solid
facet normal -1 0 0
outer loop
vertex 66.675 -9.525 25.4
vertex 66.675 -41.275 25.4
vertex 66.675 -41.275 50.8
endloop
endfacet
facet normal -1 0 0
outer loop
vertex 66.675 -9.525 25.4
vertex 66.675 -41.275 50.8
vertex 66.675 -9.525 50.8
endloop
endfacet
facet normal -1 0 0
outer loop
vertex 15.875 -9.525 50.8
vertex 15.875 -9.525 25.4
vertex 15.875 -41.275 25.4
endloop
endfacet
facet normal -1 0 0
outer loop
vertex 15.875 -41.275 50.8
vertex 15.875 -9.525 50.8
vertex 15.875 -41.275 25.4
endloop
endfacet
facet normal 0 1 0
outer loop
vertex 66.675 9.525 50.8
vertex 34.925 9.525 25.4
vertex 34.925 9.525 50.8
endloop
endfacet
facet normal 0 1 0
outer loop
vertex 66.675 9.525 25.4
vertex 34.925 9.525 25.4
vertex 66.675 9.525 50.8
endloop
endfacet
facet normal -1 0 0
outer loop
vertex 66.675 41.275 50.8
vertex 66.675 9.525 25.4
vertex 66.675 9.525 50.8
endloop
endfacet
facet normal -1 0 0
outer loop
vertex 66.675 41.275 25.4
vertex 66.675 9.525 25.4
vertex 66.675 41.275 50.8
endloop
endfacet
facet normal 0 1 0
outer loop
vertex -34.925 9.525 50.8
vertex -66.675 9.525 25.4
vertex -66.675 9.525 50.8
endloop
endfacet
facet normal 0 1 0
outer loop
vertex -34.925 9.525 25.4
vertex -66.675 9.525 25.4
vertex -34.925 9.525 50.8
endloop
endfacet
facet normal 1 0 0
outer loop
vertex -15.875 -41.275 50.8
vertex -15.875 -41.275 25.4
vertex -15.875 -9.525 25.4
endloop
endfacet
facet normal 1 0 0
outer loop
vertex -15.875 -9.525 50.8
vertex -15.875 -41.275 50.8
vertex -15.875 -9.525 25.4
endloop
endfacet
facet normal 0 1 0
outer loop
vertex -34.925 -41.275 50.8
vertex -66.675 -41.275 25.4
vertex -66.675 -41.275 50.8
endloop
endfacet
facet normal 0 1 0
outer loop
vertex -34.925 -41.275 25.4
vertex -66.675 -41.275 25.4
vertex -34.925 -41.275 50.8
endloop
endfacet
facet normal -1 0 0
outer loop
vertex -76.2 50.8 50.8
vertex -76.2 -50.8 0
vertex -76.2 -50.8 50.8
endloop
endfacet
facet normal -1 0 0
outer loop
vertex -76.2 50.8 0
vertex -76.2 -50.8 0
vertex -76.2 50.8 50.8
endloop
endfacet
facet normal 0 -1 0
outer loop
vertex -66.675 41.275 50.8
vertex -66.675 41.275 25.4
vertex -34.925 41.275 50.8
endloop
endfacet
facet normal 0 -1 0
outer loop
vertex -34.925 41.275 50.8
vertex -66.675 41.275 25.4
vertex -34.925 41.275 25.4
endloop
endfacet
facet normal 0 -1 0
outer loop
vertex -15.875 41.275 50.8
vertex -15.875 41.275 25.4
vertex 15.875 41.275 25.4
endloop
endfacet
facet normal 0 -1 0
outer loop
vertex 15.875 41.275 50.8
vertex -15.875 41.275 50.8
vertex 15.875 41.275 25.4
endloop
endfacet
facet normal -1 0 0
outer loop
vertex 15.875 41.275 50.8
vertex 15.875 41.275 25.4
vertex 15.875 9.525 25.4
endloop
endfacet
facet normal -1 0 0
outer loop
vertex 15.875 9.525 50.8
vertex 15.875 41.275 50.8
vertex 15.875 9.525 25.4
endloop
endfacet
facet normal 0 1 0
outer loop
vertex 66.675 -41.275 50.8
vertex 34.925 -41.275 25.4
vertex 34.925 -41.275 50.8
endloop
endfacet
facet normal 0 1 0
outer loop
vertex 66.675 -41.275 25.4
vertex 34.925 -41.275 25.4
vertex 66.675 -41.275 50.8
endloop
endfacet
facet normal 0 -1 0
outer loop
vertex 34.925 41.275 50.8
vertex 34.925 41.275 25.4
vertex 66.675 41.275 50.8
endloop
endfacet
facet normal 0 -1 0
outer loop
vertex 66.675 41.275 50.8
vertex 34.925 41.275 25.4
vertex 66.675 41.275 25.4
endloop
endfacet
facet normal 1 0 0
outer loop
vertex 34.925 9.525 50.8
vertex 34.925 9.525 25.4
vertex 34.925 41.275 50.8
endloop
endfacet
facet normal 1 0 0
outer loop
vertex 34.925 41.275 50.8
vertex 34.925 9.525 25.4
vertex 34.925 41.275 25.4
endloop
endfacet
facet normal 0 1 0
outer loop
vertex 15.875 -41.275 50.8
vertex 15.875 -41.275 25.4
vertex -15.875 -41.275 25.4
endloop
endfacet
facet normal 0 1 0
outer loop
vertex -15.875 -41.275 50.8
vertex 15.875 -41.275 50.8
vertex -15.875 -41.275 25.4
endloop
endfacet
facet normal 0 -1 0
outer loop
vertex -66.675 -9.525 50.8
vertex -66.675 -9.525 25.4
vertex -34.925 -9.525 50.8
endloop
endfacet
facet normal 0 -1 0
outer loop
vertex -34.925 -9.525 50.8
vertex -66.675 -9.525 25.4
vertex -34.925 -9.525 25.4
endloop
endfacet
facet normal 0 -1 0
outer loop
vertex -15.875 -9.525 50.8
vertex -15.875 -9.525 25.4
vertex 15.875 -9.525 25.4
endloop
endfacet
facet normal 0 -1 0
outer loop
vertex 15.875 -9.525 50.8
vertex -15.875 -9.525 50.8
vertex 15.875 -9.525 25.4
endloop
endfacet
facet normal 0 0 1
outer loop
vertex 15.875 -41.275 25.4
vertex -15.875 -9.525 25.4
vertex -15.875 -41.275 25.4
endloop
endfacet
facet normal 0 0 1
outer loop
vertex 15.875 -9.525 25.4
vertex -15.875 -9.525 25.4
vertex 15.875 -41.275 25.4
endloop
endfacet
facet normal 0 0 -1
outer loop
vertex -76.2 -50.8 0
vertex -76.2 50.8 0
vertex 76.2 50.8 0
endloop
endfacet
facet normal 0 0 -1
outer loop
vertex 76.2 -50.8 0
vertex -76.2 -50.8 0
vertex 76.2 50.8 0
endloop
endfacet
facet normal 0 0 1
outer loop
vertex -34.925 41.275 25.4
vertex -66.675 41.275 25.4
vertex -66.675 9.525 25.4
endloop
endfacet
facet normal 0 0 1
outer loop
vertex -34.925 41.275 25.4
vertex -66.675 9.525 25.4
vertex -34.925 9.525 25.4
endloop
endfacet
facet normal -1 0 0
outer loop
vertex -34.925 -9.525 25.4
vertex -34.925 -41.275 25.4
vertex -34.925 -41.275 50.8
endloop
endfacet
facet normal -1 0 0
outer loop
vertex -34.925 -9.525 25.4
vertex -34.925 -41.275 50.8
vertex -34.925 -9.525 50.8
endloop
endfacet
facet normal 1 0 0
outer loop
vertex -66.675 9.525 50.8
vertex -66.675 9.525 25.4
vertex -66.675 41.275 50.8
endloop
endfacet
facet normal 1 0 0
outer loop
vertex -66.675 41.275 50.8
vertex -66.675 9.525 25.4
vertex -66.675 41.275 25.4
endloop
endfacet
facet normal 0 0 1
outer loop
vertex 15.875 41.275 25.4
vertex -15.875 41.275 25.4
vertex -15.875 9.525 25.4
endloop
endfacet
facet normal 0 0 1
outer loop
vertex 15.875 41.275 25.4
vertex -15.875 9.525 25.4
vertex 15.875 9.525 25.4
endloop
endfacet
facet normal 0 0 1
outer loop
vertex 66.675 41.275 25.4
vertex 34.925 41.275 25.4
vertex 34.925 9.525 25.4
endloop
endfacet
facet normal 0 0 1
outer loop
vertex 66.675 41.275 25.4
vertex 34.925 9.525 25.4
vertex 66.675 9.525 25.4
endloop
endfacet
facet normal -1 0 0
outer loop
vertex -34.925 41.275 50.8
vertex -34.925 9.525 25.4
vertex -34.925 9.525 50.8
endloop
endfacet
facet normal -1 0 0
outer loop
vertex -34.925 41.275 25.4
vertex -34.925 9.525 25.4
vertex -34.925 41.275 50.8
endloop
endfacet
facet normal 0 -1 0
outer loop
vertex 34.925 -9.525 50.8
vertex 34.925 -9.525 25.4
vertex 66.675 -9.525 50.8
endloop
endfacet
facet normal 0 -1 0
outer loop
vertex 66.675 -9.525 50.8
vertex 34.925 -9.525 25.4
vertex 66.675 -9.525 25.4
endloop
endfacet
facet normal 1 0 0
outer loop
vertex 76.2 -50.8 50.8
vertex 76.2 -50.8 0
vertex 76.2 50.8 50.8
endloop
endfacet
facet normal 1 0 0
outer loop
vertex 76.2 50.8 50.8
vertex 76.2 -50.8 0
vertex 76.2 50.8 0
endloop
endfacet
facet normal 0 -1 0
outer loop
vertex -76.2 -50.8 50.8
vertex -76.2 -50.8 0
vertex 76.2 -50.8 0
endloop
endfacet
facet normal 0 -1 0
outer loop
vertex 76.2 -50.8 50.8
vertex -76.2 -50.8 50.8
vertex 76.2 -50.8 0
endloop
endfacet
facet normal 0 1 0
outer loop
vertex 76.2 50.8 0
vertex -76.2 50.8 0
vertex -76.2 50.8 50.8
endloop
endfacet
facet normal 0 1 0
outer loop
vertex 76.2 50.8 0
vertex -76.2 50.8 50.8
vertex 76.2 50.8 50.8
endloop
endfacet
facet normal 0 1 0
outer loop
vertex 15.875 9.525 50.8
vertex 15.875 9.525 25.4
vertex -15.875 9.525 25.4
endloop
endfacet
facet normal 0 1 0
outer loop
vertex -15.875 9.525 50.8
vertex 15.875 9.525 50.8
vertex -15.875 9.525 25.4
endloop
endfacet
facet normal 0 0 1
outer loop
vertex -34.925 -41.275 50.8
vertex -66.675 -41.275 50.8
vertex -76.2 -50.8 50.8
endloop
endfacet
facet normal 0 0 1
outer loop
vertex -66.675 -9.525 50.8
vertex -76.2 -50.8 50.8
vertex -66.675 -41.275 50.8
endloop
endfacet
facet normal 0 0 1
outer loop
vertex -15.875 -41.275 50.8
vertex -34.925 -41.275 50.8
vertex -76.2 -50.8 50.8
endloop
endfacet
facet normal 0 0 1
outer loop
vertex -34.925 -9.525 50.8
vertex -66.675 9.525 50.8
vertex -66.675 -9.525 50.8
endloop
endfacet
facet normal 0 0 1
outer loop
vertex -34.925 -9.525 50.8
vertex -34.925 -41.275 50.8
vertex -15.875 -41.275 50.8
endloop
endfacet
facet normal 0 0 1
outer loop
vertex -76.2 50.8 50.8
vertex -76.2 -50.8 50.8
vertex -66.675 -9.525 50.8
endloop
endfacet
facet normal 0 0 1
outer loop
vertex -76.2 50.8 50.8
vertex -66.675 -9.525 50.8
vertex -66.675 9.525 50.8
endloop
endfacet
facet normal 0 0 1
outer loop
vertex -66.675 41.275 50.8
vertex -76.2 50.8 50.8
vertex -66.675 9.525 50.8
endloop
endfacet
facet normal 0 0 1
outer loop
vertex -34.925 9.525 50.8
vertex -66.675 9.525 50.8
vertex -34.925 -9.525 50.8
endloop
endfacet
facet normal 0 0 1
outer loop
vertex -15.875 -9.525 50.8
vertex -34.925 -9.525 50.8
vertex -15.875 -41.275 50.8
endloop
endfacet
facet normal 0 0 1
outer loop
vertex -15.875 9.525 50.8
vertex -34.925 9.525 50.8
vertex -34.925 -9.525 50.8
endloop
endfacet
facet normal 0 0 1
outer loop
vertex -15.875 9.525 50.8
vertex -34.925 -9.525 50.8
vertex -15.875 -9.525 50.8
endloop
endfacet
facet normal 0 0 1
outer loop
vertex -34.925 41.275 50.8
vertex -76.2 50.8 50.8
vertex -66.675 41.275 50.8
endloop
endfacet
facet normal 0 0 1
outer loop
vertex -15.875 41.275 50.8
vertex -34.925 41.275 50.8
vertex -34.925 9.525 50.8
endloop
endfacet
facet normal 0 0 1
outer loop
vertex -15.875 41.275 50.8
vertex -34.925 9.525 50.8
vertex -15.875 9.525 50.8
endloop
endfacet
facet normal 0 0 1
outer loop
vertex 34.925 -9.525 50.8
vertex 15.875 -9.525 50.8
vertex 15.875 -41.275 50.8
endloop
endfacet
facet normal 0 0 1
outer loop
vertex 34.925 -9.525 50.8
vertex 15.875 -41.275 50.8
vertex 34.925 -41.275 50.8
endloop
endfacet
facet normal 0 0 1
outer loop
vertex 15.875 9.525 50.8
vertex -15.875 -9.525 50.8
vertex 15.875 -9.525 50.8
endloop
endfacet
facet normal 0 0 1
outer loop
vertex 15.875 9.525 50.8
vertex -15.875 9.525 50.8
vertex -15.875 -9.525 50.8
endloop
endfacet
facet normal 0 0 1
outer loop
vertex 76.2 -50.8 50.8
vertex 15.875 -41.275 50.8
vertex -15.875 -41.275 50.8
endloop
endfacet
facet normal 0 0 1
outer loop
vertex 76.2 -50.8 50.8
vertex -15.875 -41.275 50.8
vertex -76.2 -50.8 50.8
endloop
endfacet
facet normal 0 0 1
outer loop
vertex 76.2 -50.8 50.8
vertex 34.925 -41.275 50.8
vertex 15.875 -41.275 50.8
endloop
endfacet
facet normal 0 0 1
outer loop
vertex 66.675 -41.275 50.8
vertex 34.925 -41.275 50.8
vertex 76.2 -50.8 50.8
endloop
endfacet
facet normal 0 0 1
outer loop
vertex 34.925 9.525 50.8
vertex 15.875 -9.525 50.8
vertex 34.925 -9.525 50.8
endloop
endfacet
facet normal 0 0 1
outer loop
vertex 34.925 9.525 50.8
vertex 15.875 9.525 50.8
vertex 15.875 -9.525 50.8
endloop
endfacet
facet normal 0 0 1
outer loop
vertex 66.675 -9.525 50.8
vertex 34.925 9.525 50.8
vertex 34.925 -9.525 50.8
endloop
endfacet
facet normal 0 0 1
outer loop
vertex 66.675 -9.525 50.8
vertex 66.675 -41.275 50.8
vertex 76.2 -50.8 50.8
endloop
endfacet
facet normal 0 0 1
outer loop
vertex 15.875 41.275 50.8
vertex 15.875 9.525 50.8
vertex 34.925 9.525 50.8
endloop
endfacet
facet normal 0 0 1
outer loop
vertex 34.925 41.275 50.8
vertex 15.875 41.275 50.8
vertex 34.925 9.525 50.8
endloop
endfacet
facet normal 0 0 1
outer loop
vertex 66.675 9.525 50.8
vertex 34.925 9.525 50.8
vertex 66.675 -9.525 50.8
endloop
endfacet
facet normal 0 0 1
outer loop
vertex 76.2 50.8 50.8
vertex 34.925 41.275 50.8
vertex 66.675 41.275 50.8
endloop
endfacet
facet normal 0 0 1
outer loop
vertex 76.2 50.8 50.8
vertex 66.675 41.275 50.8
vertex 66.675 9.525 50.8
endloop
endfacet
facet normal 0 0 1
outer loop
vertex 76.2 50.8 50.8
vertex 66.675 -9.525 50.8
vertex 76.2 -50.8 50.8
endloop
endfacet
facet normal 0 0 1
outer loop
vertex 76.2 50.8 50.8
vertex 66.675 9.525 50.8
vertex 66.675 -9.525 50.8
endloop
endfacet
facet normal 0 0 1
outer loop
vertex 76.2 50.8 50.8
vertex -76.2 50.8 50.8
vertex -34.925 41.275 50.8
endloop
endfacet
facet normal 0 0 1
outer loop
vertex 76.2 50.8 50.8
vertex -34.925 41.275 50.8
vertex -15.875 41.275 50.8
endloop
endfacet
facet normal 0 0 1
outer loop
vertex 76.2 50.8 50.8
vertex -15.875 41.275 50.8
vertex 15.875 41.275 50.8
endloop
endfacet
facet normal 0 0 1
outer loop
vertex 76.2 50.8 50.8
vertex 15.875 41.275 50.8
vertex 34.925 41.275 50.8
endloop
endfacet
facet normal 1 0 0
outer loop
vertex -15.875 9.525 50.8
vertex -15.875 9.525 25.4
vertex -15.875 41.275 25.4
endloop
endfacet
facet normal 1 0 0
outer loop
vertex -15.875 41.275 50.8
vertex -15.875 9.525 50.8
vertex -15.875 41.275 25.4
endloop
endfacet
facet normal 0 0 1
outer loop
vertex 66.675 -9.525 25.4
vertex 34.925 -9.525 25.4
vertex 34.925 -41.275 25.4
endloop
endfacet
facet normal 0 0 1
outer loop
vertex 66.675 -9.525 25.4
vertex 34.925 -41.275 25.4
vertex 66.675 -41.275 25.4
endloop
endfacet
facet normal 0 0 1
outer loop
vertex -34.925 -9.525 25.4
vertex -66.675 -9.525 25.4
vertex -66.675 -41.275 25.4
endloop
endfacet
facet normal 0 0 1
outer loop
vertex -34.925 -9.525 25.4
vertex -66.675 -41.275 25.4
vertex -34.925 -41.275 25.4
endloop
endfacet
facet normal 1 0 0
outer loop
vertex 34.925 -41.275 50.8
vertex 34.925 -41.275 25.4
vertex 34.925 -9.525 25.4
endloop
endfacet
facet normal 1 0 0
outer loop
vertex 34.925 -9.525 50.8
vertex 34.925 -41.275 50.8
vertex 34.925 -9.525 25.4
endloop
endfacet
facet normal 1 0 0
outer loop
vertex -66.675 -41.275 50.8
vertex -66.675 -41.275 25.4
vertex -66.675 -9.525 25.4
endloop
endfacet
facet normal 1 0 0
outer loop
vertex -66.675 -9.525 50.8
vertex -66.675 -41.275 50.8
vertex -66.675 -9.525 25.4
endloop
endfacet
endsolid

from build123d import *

# Parameters (mm, degrees)
F0_W     = 152.4
F0_H     = 101.6
F0_W_2   = 31.75
F0_H_2   = 31.75
F1_DEPTH = 50.8
F2_DEPTH = 25.4


with BuildPart() as f1:
    # F0 (on Top) → F1 (new body)
    with BuildSketch(Plane.XY):
        Rectangle(F0_W, F0_H)
        with Locations((-50.8, -25.4)):
            Rectangle(F0_W_2, F0_H_2, mode=Mode.SUBTRACT)
        Polygon((-15.875, -9.525), (0, -9.525), (15.875, -9.525), (15.875, -41.275), (-15.875, -41.275), align=None, mode=Mode.SUBTRACT)
        with Locations((50.8, -25.4)):
            Rectangle(F0_W_2, F0_H_2, mode=Mode.SUBTRACT)
        with Locations((-50.8, 25.4)):
            Rectangle(F0_W_2, F0_H_2, mode=Mode.SUBTRACT)
        Polygon((-15.875, 9.525), (-15.875, 41.275), (15.875, 41.275), (15.875, 9.525), (0, 9.525), align=None, mode=Mode.SUBTRACT)
        with Locations((50.8, 25.4)):
            Rectangle(F0_W_2, F0_H_2, mode=Mode.SUBTRACT)
    extrude(amount=F1_DEPTH)

    # F0 (on Top) → F2 (join)
    with BuildSketch(Plane.XY):
        with Locations((-50.8, 25.4)):
            Rectangle(F0_W_2, F0_H_2)
        Polygon((15.875, 41.275), (-15.875, 41.275), (-15.875, 9.525), (0, 9.525), (15.875, 9.525), align=None)
        with Locations((50.8, 25.4)):
            Rectangle(F0_W_2, F0_H_2)
        with Locations((50.8, -25.4)):
            Rectangle(F0_W_2, F0_H_2)
        Polygon((15.875, -9.525), (0, -9.525), (-15.875, -9.525), (-15.875, -41.275), (15.875, -41.275), align=None)
        with Locations((-50.8, -25.4)):
            Rectangle(F0_W_2, F0_H_2)
    extrude(amount=F2_DEPTH)


solid = f1.part
